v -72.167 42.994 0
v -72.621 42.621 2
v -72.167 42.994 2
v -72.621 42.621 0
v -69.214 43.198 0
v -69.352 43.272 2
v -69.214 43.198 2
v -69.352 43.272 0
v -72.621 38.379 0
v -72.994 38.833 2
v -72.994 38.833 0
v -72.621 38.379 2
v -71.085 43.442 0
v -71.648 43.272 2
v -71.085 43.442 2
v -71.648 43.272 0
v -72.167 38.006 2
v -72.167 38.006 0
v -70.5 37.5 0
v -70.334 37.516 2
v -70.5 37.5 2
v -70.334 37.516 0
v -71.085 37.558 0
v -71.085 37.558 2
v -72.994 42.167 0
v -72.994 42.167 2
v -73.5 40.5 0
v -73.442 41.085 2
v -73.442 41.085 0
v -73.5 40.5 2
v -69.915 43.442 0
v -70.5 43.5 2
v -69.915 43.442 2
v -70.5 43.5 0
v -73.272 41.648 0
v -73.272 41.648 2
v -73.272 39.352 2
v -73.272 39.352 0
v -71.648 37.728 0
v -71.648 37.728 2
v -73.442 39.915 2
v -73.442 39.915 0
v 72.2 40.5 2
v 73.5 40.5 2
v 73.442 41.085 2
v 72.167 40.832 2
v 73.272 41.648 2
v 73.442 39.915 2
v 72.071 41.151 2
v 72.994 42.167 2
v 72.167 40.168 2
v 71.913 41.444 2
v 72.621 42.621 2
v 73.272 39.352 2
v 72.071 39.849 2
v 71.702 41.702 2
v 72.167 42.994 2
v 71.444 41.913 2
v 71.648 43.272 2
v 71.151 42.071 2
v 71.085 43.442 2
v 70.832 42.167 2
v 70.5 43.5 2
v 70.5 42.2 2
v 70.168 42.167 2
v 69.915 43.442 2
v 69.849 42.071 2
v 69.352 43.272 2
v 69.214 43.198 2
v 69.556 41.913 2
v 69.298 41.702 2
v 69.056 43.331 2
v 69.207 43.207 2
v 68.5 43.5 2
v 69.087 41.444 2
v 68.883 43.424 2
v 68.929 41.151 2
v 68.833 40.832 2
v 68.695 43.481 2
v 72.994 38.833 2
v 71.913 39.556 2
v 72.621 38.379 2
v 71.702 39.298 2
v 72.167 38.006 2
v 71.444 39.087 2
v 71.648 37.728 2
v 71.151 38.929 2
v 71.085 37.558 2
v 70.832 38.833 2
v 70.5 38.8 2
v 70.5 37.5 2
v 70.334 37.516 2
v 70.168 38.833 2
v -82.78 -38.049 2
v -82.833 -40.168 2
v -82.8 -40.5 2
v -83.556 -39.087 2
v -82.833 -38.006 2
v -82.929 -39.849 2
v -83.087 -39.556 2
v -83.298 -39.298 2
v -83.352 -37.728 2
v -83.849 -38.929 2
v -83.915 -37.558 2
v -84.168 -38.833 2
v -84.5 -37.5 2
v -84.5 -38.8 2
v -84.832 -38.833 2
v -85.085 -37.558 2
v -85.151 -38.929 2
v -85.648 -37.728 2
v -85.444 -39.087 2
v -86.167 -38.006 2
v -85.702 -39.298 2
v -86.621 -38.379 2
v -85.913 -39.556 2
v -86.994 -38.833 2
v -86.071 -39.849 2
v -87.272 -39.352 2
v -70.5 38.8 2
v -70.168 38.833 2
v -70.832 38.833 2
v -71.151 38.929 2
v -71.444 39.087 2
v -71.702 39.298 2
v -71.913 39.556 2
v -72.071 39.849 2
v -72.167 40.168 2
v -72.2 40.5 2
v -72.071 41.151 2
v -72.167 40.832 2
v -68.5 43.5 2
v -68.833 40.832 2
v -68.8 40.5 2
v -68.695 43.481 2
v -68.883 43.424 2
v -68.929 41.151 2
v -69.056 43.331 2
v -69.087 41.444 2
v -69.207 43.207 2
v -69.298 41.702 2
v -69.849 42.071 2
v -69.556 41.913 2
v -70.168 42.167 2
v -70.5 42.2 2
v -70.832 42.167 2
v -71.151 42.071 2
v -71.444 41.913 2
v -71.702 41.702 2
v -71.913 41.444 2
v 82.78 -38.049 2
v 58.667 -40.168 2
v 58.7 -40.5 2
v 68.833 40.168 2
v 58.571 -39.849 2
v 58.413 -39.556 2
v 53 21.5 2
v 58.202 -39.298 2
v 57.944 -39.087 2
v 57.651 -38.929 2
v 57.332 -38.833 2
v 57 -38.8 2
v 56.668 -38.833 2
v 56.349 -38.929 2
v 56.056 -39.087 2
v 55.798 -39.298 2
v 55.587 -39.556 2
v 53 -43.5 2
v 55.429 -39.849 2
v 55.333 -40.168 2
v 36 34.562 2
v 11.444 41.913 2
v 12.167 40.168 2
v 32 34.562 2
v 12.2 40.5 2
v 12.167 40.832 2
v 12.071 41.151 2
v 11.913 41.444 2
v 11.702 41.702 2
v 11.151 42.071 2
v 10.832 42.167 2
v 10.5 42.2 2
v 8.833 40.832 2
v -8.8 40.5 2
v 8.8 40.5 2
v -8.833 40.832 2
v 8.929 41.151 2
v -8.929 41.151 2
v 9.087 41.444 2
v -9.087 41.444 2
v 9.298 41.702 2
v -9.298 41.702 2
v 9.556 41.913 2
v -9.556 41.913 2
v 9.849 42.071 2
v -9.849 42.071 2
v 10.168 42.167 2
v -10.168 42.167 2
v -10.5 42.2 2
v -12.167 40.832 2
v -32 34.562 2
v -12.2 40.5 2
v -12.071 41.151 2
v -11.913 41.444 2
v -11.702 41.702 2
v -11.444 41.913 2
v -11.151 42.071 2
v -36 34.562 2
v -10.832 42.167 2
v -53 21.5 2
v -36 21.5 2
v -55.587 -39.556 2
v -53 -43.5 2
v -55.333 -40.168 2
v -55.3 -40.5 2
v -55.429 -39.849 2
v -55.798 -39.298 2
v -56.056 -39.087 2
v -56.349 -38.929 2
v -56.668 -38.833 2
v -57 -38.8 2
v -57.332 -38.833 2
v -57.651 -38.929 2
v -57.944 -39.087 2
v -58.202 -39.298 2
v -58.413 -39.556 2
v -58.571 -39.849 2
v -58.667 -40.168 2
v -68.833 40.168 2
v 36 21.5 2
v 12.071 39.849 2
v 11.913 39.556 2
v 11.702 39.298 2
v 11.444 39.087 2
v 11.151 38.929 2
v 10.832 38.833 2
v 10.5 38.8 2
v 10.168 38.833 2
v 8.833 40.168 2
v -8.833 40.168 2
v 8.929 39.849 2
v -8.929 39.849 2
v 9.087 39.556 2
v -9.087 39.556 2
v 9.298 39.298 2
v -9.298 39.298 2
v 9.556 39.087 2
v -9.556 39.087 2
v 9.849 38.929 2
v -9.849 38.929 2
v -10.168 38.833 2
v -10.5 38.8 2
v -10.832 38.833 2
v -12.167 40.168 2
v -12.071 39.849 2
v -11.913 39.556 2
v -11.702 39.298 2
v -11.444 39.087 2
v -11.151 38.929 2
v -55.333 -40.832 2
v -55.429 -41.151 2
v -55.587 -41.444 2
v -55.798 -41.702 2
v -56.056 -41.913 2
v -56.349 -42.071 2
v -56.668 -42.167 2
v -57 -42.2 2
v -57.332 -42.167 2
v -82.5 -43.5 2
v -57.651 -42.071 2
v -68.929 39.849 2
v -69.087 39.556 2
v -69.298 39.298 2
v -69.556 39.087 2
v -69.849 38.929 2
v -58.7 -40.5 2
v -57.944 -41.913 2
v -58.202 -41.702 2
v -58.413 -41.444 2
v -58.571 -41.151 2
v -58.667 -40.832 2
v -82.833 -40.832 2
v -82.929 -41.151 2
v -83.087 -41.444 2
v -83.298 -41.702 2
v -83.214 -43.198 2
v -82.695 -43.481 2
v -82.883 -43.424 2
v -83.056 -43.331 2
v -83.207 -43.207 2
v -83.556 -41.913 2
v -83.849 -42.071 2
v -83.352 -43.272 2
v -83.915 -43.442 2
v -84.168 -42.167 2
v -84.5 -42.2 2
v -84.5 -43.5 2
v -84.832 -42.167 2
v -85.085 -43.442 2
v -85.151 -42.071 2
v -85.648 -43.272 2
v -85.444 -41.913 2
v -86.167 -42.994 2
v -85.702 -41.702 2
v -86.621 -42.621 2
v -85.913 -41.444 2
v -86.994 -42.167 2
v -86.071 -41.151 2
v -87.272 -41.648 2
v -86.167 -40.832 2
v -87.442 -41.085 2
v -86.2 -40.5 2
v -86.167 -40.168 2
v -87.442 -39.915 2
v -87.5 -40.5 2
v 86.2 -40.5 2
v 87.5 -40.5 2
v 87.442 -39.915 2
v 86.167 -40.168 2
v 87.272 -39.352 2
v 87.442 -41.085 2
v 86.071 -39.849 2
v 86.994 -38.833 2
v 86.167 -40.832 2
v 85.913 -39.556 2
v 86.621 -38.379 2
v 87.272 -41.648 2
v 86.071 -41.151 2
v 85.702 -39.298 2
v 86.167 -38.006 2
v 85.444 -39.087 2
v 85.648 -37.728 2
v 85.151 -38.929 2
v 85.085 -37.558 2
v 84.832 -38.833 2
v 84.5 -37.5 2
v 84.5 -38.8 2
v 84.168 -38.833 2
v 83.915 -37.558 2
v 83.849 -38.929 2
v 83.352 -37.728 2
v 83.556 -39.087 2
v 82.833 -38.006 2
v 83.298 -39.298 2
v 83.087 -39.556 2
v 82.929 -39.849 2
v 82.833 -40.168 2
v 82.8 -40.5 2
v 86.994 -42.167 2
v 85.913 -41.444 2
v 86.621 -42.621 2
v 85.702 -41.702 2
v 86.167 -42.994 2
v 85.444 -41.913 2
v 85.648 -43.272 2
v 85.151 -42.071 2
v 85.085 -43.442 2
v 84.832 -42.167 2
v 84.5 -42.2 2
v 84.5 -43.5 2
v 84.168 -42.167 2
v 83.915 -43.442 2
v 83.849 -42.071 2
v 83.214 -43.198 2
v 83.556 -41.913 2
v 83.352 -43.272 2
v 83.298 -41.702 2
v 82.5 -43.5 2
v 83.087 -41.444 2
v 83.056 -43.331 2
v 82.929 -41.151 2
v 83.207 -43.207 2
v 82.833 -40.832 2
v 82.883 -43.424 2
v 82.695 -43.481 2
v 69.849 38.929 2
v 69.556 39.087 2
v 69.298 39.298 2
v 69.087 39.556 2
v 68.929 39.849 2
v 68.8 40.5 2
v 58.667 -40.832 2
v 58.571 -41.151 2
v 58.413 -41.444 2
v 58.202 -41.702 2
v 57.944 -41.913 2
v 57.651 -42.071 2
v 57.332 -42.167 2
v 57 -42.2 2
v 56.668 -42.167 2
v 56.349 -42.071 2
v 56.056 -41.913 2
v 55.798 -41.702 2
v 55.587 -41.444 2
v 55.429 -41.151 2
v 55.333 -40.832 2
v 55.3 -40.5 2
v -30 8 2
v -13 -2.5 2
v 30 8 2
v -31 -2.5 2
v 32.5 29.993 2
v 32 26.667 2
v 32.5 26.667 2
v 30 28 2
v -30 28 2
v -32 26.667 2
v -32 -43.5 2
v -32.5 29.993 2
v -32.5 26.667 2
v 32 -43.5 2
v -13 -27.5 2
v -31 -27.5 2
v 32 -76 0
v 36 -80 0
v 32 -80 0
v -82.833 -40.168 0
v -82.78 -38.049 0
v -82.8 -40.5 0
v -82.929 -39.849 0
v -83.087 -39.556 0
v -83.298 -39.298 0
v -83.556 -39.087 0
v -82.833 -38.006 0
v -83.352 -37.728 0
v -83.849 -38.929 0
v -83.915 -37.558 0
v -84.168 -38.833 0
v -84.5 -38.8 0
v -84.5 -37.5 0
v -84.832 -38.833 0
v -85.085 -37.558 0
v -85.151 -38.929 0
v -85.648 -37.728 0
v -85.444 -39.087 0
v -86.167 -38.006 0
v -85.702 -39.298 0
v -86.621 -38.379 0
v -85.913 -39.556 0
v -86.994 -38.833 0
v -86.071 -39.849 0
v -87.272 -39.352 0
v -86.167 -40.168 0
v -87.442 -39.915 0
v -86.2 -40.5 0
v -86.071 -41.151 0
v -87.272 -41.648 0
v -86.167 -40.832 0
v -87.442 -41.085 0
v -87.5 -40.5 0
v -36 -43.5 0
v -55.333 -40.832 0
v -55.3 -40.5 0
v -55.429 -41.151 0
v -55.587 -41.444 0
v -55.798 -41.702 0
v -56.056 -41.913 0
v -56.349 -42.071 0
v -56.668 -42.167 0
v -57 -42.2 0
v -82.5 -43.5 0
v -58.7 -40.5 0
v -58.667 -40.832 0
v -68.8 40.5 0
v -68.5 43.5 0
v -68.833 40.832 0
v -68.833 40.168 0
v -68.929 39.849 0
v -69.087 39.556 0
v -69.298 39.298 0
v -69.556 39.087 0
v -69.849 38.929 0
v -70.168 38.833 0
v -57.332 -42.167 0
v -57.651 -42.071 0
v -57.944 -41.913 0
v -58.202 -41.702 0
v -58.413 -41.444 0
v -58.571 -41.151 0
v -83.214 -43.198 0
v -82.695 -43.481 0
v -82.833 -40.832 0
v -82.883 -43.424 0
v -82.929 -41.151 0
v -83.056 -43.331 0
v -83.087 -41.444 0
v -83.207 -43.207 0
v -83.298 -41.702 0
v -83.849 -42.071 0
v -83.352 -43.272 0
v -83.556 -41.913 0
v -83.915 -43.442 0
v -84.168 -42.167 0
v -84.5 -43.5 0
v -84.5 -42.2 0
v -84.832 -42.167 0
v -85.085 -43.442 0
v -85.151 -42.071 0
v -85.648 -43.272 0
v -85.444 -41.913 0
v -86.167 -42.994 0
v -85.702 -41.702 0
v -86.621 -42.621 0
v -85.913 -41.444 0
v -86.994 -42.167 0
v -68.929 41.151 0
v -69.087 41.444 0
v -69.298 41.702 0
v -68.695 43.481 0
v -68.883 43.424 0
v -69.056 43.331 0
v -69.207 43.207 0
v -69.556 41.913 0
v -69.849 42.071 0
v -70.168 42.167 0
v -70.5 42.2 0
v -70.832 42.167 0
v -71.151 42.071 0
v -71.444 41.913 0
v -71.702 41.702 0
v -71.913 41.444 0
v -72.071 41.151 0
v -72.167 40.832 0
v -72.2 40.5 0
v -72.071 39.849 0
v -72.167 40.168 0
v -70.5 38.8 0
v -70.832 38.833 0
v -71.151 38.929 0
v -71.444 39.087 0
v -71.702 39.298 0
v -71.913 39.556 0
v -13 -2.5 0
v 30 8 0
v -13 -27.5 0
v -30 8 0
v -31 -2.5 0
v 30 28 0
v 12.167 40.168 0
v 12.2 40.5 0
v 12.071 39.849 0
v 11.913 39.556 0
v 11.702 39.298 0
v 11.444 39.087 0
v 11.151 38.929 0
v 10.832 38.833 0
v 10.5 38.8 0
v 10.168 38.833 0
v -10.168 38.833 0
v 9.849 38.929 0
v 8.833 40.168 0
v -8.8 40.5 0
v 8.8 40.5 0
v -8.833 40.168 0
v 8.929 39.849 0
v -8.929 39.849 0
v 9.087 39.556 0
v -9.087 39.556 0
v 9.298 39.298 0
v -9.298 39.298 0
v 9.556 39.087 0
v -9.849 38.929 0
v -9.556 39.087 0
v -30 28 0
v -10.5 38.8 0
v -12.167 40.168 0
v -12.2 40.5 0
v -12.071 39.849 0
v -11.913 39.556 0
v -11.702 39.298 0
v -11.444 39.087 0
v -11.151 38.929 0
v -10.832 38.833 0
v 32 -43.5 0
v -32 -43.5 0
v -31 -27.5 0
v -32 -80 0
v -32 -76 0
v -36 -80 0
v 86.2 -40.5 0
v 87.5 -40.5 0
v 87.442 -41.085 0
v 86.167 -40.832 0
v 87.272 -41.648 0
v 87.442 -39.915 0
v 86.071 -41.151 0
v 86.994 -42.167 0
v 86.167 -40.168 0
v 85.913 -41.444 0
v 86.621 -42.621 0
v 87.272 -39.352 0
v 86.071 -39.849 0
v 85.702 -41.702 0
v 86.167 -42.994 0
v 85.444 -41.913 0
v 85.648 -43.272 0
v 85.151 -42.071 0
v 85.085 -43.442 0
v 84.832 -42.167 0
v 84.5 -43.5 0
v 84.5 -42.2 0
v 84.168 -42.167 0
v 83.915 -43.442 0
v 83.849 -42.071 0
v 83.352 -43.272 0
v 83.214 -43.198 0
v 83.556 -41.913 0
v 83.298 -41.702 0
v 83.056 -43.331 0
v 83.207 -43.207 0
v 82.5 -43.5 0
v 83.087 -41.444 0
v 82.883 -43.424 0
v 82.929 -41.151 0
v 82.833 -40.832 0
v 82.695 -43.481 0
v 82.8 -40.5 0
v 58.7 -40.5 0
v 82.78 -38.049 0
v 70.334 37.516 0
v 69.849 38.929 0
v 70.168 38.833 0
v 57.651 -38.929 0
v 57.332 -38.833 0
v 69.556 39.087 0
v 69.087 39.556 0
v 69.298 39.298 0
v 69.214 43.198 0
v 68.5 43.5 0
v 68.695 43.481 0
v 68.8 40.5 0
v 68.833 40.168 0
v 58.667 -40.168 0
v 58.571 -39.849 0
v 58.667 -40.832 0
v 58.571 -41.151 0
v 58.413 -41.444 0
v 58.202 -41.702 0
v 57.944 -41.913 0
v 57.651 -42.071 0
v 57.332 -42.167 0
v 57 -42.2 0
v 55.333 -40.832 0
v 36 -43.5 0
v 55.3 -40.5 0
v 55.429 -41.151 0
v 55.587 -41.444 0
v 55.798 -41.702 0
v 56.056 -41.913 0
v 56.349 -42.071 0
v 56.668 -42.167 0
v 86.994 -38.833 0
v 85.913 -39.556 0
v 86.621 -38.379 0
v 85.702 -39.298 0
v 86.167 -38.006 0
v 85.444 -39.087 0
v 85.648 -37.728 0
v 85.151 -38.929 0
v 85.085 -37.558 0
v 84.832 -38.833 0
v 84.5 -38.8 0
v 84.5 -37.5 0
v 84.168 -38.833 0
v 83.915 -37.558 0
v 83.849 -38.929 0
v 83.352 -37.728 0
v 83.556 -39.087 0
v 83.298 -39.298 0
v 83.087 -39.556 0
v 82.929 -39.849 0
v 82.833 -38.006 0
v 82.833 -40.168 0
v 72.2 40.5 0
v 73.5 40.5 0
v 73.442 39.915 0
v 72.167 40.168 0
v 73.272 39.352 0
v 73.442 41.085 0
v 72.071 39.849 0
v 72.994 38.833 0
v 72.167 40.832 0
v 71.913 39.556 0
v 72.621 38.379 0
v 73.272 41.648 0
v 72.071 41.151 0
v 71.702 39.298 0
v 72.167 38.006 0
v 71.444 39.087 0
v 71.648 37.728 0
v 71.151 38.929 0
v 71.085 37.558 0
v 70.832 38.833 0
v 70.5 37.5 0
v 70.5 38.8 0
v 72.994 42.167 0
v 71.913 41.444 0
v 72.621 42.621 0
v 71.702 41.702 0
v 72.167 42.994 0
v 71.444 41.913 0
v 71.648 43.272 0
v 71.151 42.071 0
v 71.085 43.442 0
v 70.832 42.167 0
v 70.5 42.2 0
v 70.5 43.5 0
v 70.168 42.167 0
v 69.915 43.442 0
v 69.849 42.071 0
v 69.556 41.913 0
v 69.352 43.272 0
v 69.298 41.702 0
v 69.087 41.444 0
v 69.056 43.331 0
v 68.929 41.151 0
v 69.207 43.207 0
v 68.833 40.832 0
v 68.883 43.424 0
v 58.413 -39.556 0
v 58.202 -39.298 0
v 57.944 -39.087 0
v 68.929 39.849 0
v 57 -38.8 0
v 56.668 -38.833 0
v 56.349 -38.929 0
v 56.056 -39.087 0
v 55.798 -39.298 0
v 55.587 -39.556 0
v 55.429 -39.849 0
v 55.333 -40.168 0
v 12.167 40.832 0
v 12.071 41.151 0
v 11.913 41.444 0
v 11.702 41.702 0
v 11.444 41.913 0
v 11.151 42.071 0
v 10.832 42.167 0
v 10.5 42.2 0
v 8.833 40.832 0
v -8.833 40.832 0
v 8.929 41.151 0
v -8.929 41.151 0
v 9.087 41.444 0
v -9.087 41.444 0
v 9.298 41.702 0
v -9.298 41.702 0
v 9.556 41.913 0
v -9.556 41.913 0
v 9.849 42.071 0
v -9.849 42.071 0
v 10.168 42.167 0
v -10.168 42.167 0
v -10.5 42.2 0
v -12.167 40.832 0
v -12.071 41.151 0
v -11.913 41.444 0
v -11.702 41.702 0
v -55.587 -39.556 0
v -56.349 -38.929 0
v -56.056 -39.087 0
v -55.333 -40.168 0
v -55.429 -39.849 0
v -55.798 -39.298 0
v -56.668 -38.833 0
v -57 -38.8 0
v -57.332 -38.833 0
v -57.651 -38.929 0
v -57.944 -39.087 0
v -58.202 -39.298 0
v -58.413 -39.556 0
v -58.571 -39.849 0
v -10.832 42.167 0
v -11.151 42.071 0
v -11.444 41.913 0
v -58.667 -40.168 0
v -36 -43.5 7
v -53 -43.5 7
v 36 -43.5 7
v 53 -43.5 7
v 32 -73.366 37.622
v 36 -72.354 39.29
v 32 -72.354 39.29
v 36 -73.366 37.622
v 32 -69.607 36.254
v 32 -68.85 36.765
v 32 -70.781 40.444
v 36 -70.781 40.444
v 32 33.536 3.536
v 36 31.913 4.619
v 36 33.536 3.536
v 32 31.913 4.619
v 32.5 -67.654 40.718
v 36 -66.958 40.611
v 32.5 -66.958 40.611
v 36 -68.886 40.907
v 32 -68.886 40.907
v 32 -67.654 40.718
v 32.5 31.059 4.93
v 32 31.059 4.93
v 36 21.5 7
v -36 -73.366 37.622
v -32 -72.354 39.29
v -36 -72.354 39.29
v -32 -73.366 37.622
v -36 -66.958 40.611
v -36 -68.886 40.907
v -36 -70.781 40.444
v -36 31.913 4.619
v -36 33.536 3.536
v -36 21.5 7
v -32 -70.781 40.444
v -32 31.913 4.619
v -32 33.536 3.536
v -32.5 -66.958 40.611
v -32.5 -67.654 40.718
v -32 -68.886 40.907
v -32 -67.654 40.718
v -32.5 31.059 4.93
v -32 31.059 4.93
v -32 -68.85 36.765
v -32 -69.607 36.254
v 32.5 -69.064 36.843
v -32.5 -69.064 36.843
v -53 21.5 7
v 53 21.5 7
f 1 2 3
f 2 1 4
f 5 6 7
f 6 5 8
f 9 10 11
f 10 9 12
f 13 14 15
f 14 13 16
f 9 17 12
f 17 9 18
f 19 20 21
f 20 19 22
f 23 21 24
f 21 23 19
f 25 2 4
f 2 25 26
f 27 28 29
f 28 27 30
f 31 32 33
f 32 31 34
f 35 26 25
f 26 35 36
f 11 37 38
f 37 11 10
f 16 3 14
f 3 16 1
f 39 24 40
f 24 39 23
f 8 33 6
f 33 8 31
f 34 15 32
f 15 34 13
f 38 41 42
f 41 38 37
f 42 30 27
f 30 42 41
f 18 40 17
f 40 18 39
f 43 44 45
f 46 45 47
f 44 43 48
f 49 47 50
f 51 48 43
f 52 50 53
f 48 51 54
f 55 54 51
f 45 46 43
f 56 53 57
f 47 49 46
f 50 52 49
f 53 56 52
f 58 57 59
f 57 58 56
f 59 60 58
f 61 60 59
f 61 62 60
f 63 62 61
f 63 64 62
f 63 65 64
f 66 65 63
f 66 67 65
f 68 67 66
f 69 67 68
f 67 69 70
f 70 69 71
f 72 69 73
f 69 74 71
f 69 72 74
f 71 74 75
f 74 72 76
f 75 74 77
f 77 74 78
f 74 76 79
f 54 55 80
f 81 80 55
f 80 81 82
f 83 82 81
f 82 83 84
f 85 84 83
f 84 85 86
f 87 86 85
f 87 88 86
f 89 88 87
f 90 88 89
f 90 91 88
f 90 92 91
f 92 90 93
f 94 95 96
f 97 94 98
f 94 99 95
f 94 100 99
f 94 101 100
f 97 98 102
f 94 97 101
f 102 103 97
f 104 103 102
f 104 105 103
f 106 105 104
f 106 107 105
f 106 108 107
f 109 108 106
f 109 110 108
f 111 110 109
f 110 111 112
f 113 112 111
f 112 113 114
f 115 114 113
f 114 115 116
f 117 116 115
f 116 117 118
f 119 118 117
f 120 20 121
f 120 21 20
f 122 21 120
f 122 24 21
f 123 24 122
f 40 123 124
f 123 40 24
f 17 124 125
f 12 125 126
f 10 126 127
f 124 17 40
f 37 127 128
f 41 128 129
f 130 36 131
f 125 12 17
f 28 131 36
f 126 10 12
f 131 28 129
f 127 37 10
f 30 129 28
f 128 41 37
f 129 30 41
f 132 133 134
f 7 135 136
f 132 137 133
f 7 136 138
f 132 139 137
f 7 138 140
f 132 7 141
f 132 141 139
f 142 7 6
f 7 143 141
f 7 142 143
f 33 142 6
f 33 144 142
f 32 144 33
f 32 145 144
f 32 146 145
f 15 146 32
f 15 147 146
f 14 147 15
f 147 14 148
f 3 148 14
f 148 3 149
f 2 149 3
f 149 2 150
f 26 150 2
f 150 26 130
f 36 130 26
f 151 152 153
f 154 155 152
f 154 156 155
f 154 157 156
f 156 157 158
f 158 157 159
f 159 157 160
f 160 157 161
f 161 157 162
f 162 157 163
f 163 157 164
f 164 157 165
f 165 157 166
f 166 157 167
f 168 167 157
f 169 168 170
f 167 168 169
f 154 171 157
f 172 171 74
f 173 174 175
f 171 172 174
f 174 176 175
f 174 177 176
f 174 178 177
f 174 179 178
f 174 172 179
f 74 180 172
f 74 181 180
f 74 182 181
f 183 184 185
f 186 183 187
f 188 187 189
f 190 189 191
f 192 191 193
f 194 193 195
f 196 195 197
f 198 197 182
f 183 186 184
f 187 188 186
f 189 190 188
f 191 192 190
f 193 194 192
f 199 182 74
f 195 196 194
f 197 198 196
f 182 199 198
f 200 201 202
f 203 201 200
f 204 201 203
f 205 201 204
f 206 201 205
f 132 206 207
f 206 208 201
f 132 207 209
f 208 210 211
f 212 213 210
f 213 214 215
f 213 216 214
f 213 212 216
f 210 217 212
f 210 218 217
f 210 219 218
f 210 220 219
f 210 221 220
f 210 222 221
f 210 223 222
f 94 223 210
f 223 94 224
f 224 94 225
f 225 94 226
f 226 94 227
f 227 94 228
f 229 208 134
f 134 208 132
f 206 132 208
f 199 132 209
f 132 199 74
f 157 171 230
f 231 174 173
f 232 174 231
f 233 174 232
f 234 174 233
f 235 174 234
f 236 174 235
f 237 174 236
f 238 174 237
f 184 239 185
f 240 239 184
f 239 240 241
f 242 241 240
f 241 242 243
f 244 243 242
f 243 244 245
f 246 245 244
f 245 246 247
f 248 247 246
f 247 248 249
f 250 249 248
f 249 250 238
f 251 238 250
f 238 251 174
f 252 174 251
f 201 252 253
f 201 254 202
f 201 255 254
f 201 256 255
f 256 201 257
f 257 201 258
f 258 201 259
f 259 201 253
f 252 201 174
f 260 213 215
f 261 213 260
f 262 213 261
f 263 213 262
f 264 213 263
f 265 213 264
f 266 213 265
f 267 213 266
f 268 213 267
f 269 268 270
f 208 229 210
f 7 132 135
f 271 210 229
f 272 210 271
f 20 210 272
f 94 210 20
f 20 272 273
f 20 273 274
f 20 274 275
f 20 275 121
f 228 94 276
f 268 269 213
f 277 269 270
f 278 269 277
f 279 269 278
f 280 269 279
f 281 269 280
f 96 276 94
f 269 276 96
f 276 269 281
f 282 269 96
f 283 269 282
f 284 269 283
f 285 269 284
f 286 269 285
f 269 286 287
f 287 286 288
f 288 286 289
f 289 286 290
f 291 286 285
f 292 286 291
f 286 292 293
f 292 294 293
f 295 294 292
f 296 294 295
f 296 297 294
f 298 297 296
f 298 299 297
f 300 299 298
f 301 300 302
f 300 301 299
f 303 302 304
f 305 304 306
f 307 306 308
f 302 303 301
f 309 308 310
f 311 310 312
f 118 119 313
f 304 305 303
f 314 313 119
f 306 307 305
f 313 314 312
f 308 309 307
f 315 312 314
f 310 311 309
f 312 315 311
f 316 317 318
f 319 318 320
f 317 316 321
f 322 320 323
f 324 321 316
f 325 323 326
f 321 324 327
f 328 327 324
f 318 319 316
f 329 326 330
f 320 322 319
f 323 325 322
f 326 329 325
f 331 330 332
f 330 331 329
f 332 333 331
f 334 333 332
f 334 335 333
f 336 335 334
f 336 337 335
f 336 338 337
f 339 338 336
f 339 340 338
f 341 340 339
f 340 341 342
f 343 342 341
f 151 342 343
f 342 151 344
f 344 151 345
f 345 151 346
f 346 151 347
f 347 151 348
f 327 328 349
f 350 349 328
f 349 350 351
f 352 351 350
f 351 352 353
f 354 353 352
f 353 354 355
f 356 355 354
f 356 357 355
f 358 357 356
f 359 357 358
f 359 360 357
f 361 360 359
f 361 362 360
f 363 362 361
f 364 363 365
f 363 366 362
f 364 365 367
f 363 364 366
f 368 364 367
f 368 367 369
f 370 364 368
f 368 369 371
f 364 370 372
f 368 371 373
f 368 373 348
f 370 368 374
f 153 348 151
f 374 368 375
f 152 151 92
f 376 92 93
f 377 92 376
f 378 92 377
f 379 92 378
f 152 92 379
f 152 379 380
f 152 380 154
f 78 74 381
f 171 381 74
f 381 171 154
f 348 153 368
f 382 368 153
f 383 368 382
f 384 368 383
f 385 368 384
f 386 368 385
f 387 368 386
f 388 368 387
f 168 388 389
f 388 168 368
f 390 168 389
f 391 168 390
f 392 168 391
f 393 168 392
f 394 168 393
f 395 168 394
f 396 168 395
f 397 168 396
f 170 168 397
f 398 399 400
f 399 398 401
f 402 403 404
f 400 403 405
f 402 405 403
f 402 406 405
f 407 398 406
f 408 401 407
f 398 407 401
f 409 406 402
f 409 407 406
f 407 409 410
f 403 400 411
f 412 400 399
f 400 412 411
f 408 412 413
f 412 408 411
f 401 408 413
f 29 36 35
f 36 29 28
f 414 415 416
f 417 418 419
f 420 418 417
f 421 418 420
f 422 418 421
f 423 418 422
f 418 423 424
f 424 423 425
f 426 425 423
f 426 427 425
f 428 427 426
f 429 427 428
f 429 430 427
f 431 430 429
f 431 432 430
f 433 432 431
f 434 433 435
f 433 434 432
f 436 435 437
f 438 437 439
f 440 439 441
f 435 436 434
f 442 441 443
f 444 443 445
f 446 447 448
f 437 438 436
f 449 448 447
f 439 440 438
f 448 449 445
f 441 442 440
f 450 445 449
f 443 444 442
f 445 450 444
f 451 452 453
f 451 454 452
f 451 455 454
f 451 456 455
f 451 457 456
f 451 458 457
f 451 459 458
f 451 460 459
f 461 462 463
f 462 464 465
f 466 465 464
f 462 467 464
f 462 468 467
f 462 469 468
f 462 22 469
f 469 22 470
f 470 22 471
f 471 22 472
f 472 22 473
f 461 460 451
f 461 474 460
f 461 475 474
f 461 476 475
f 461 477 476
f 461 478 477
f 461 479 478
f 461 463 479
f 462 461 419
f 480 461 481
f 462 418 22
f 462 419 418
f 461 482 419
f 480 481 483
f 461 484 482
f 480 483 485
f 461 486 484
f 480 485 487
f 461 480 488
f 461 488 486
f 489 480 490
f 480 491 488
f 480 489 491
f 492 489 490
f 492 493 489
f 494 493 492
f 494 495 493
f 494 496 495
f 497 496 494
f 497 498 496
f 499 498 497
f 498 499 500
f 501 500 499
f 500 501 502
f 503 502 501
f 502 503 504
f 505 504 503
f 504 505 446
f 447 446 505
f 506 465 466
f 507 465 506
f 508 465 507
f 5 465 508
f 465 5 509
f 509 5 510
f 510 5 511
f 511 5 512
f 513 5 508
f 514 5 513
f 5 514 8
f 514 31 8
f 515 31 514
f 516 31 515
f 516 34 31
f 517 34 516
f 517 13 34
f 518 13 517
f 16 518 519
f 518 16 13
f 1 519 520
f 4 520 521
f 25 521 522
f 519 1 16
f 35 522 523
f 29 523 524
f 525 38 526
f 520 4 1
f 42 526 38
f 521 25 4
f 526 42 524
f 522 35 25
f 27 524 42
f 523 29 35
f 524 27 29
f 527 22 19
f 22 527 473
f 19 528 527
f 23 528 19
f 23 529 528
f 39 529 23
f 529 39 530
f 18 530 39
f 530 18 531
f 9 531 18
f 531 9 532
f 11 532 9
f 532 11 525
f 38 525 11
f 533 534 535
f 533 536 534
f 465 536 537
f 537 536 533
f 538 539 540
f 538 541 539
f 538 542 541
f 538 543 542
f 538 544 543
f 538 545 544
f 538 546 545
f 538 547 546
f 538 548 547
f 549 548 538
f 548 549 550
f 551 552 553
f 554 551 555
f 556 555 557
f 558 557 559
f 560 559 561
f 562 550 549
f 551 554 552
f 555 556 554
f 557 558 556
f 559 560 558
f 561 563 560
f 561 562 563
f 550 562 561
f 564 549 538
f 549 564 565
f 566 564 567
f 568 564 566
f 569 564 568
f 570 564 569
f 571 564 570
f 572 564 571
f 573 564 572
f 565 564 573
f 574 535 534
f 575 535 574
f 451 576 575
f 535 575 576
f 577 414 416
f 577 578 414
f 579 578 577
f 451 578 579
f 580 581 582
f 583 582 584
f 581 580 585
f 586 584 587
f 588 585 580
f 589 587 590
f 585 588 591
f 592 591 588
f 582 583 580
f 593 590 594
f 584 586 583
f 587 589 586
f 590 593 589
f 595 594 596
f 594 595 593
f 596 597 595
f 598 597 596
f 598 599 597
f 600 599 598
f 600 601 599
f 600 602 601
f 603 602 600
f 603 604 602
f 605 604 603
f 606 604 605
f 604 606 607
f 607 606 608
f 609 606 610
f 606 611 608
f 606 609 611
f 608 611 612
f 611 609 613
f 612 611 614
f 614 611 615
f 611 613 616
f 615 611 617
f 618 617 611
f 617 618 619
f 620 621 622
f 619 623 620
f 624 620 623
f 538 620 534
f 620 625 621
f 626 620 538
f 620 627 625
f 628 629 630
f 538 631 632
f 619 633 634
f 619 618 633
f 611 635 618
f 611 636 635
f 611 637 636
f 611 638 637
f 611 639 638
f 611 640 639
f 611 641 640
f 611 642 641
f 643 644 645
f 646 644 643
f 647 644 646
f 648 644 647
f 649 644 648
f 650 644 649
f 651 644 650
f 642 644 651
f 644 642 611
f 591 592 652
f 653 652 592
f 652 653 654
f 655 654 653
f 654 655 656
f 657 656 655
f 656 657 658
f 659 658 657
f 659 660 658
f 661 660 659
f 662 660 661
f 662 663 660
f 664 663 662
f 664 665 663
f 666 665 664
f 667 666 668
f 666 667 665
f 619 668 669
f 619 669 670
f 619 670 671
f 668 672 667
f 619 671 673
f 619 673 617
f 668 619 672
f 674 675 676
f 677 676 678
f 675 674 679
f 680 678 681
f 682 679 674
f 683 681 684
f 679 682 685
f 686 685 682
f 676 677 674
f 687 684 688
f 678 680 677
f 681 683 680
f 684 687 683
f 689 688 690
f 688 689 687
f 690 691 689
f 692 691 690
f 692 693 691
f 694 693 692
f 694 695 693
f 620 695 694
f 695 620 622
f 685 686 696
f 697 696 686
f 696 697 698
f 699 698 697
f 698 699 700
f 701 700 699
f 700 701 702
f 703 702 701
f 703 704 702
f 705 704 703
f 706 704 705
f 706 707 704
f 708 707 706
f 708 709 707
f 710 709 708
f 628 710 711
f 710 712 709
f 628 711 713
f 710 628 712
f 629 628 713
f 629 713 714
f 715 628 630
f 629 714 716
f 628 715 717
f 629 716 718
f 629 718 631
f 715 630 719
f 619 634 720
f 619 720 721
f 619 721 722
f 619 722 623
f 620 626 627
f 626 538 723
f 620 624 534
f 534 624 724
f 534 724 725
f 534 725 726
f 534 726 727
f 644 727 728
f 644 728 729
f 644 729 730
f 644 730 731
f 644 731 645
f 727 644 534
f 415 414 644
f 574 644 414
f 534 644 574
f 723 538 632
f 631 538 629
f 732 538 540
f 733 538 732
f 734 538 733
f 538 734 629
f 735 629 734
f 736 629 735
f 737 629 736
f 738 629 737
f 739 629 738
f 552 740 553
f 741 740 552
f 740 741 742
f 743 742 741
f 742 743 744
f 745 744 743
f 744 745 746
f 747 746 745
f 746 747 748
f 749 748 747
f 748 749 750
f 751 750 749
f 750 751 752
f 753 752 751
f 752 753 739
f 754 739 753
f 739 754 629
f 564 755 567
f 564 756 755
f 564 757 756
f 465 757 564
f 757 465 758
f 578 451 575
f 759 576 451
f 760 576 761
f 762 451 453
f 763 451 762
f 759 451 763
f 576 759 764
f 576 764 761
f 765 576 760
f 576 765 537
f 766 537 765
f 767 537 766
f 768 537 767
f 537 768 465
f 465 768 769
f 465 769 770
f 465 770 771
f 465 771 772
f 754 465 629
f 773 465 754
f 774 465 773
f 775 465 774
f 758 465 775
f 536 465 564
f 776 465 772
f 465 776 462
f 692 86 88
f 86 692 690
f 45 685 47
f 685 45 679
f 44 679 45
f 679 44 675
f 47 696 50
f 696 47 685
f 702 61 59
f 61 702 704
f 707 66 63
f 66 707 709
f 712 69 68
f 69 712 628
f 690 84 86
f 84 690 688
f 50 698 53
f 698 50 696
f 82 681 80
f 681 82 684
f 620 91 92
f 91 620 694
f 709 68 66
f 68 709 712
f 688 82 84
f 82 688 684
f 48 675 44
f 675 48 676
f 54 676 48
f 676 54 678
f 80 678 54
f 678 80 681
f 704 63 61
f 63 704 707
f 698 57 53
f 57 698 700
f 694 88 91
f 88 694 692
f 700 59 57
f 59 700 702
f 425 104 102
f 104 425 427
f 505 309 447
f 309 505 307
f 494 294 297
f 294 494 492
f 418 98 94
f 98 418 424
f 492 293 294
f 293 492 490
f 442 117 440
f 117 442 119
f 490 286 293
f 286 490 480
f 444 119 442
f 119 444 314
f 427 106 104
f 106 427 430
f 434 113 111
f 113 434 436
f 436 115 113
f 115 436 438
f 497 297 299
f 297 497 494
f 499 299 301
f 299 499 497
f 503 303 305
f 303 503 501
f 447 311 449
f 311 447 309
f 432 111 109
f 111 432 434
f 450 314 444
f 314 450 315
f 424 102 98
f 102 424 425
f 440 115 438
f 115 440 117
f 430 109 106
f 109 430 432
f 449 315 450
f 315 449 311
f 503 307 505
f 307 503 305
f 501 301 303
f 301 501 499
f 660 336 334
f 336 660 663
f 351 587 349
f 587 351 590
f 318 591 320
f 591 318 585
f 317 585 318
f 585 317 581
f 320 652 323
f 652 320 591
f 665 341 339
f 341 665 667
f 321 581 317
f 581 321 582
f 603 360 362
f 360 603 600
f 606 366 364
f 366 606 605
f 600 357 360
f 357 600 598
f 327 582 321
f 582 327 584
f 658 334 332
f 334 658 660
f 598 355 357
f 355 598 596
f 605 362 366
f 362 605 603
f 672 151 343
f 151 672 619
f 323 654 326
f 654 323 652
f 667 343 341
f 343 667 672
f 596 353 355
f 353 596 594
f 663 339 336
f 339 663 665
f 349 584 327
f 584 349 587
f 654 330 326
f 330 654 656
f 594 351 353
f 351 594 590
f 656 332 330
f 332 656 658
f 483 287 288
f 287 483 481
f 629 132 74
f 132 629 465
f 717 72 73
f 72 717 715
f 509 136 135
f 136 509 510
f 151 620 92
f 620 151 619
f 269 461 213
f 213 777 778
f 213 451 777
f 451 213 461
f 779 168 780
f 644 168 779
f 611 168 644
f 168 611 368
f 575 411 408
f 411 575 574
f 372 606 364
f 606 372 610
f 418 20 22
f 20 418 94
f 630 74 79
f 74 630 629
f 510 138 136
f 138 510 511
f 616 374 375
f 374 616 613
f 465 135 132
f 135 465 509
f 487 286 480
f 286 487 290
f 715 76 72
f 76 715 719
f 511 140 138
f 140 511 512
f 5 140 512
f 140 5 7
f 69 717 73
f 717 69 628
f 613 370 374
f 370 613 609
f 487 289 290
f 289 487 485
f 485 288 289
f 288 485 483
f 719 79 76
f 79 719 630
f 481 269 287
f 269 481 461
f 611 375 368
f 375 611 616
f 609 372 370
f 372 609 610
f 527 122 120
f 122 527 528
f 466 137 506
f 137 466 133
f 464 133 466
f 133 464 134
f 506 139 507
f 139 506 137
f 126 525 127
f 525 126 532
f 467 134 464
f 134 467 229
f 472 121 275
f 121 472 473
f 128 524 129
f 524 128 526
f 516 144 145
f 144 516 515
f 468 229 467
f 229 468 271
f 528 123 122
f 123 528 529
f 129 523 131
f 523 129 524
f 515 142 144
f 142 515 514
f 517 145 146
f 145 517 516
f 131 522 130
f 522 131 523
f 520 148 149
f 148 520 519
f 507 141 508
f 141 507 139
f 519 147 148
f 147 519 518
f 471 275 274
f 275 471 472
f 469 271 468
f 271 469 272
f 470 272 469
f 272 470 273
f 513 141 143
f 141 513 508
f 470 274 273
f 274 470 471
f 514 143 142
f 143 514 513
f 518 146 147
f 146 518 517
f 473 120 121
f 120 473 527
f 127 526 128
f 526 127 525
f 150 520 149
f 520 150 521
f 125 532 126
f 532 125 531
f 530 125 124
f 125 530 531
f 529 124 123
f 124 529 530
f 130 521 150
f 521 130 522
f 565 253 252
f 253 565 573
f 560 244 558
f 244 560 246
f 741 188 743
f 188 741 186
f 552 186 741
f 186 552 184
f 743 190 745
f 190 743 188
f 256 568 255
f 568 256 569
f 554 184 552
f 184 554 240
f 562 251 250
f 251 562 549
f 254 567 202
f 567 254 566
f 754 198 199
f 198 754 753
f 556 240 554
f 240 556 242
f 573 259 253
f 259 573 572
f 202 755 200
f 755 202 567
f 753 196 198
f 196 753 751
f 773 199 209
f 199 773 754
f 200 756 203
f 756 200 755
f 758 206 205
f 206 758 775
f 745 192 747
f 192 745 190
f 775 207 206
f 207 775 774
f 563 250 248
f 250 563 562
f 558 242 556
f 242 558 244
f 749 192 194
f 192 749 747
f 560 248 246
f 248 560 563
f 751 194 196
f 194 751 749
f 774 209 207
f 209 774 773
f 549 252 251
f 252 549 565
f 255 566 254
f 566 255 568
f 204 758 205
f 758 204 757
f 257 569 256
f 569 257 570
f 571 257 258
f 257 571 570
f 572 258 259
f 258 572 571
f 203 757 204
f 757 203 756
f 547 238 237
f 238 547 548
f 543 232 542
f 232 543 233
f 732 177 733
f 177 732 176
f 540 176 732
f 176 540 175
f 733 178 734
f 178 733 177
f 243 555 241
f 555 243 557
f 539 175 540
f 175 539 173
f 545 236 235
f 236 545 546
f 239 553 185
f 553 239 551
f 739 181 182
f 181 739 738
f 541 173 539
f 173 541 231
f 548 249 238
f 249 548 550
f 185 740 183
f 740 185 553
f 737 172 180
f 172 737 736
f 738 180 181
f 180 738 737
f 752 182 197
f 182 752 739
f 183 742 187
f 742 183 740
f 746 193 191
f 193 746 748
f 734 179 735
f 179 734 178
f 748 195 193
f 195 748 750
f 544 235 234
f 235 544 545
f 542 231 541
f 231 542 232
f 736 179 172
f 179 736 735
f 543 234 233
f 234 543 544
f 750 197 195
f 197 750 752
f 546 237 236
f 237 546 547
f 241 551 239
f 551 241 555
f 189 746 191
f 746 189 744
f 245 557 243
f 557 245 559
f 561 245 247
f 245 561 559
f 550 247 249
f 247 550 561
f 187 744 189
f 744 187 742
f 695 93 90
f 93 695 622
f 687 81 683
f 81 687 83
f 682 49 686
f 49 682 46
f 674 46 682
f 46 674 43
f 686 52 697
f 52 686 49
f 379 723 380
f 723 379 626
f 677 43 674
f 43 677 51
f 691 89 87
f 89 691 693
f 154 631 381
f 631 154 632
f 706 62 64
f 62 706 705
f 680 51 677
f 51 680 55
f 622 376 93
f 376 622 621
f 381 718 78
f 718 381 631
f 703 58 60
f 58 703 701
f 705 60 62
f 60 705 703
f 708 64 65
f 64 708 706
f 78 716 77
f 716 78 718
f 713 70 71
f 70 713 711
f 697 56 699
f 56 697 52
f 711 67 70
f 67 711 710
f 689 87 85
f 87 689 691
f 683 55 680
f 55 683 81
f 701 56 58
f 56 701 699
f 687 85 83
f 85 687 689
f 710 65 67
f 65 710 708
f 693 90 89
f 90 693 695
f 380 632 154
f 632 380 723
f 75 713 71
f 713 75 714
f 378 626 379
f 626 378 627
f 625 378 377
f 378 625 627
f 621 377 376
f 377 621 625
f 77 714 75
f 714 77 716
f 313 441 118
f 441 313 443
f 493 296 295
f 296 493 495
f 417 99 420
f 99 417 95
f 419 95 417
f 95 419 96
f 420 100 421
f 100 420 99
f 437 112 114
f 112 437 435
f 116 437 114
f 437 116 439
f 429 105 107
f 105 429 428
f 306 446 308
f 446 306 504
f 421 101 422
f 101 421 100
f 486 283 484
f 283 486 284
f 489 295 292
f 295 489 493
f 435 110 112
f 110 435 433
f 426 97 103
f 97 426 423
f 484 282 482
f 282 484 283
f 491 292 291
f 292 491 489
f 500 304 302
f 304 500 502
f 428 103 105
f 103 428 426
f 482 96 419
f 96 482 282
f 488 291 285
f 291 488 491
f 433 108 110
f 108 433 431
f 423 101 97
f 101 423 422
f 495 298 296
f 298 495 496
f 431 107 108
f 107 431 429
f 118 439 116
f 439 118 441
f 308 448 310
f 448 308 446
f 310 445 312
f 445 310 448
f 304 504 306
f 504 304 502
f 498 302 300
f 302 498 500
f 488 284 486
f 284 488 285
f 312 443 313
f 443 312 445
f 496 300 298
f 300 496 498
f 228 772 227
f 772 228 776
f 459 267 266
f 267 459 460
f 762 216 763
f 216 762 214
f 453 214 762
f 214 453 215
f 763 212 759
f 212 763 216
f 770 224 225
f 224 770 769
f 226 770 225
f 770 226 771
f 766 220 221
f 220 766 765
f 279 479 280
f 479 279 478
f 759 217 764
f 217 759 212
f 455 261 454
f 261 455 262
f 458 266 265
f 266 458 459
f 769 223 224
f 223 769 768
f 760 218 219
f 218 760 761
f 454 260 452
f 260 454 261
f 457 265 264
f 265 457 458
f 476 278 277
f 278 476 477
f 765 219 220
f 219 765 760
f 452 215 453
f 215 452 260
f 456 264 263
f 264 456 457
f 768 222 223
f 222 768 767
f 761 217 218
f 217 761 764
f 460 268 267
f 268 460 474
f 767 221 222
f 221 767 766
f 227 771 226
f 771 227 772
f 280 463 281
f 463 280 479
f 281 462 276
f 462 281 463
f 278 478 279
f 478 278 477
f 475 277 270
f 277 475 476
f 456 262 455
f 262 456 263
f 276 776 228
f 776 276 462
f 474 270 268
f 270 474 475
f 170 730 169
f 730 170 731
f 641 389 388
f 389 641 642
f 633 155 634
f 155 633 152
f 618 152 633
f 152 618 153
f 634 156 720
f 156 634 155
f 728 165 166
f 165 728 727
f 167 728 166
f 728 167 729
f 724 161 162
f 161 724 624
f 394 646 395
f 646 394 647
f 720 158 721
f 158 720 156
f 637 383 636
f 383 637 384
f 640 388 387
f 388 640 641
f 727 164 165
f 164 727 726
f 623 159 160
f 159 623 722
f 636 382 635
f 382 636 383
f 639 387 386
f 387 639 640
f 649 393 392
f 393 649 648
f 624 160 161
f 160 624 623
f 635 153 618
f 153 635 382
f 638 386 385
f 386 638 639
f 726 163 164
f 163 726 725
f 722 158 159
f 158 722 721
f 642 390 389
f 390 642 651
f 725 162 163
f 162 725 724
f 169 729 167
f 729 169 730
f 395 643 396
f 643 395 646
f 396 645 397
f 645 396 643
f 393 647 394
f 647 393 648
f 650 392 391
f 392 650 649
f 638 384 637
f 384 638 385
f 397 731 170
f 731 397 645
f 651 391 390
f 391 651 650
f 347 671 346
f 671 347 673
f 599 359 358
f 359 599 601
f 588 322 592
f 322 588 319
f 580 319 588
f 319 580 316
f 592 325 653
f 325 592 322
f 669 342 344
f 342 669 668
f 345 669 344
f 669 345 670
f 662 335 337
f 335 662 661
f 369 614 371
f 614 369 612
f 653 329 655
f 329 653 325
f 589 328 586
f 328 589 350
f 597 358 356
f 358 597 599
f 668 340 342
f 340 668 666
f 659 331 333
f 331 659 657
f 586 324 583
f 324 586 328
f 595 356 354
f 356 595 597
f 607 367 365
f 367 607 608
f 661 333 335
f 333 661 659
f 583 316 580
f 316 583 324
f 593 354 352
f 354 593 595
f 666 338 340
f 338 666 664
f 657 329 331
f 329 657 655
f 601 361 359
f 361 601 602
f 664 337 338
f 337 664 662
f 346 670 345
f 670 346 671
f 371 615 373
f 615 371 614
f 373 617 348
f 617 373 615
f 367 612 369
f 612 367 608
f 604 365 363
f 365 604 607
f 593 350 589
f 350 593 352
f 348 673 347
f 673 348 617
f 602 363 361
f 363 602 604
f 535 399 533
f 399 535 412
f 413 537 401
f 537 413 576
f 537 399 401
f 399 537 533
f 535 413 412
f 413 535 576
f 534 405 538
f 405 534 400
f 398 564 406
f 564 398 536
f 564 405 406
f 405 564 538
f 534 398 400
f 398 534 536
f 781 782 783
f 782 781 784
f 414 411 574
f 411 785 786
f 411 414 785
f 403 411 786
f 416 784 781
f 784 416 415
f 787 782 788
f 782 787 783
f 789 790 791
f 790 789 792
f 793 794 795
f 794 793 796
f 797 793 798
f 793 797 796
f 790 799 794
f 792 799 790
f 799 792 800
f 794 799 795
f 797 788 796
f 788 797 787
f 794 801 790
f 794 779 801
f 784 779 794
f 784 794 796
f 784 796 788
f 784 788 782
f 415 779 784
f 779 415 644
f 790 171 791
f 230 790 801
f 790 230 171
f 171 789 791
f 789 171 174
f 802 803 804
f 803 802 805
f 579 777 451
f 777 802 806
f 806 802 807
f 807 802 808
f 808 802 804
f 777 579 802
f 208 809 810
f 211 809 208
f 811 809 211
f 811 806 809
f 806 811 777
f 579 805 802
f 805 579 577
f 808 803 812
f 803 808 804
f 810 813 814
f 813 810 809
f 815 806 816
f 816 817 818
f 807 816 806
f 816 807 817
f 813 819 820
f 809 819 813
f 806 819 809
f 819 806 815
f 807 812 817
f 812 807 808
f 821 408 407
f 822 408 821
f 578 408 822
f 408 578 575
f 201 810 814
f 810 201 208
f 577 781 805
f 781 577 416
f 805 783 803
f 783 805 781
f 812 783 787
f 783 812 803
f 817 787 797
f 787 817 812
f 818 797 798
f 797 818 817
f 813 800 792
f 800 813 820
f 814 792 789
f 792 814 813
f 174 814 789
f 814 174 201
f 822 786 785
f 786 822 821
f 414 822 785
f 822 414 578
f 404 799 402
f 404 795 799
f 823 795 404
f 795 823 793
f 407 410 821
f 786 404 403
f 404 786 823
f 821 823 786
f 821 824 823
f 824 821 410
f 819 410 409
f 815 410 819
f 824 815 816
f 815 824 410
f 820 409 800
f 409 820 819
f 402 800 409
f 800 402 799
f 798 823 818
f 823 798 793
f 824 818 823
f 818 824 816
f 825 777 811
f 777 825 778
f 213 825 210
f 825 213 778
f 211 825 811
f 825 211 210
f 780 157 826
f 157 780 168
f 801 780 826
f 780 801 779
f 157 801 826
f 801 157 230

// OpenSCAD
// file: config.scad
height = 85;
upper_width = 135;
lower_width = 163;

panel_thickness = 1.5;
top_panel_thickness = 2;
wall_thickness = 2;

outer_bar_diameter = 22;
inner_rod_diameter = 15;

dwt = wall_thickness / 2;
dy = height / 2;
dx_upper = (upper_width + wall_thickness) / 2;
dx_lower = (lower_width +wall_thickness) / 2;
dx_inner_rod = inner_rod_diameter / 2;

p_ulo = [-dx_upper, dy];
p_uli = [-dx_upper+outer_bar_diameter+dwt, dy];
p_uml = [-dx_inner_rod-dwt, dy];
p_umr = [dx_inner_rod+dwt, dy];
p_uri = [dx_upper-outer_bar_diameter-dwt, dy];
p_uro = [dx_upper, dy];

p_llo = [-dx_lower, -dy];
p_lli = [-dx_lower+outer_bar_diameter+dwt, -dy];
p_lml = [-dx_inner_rod-dwt, -dy];
p_lmr = [dx_inner_rod+dwt, -dy];
p_lri = [dx_lower-outer_bar_diameter-dwt, -dy];
p_lro = [dx_lower, -dy];

p_screws = [
  [p_ulo[0]-2, dy-2],
  [p_uml[0]-2, dy-2],
  [p_umr[0]+2, dy-2],
  [p_uro[0]+2, dy-2],
  [p_llo[0]-2, -dy+2],
  [p_lli[0]+2.5, -dy+2],
  [p_lri[0]-2.5, -dy+2],
  [p_lro[0]+2, -dy+2]
];

usb_board_pos = [-22, 36.5, 0];
can_board_position = [-40, 5, 0];
amplifier_board_pos = [-41, -26, 0];
teensy_board_pos = [-19, -10, 0];
bec_module_pos = [25, 0, 0];

mount_screw_diameter = 2.9;
upper_mount_screw_diameter = 3.4;
mount_screw_outer = 6;

small_screw_diameter = 2.1;

screen_mount_hole_size = [65, 105, 4];
screen_angle = 20;
// file: common.scad
include <config.scad>

module PointHull(points)
{
  hull()
  {
    for(p=points)
    {
      translate(p)
      {
        circle(d=wall_thickness, $fn=32);
      }
    }
  }
}

module DisplayMountPart(width, length, angle, wall)
{
  module Segment(d, l)
  {
    hull()
    {
      circle(d=d);

      translate([l-d, 0])
      {
        circle(d=d);
      }

      rotate([0, 0, angle])
      {
        translate([l-d, 0])
        {
          circle(d=d);
        }
      }
    }
  }

  rotate([90, 0, -90])
  {
    linear_extrude(height=width, center=true)
    {
      difference()
      {
        Segment(10, length);
        Segment(10 - (2 * wall), length - (2 * wall));
      }
    }

    dx = (width - wall) / 2;
    for(x=[-dx, dx])
    {
      translate([0, 0, x])
      {
        linear_extrude(height=wall, center=true)
        {
          Segment(10, length);
        }
      }
    }
  }
}
// main file
use <common.scad>
include <config.scad>

module CaseUpper()
{
  difference()
  {
    union()
    {
      linear_extrude(top_panel_thickness)
      {
        PointHull([p_ulo, p_uro, p_llo, p_lro]);
      }

      for(p=p_screws)
      {
        translate(p)
        {
          cylinder(h=top_panel_thickness, d=mount_screw_outer, $fn=32);
        }
      }
    }

    translate([0, 0, -1])
    {
      for(p=p_screws)
      {
        translate(p)
        {
          cylinder(h=top_panel_thickness+2, d=upper_mount_screw_diameter, $fn=32);
        }
      }
    }

    /* Cable routing hole */
    translate([-22, -15, 0])
    {
      cube([18, 25, 10], center=true);
    }

    /* Top of screen cutout */
    translate([0, 18, 0])
    {
      cube([60, 20, 10], center=true);
    }
  }

  difference()
  {
    intersection()
    {
      translate([0, 30, 0])
      {
        DisplayMountPart(width=72, length=115, angle=screen_angle, wall=4);
      }

      linear_extrude(height=100)
      {
        square([100, 200], center=true);
      }
    }

    rotate([-screen_angle, 0, 0])
    {
      translate([0, -25, 15])
      {
        cube(screen_mount_hole_size + [0, 0, 4], center=true);
      }
    }
  }

  /* Side braces */
  for(x=[-44, 44])
  {
    translate([x, -11, 4])
    {
      cube([18, 65, 6], center=true);
    }
  }
}

CaseUpper();
